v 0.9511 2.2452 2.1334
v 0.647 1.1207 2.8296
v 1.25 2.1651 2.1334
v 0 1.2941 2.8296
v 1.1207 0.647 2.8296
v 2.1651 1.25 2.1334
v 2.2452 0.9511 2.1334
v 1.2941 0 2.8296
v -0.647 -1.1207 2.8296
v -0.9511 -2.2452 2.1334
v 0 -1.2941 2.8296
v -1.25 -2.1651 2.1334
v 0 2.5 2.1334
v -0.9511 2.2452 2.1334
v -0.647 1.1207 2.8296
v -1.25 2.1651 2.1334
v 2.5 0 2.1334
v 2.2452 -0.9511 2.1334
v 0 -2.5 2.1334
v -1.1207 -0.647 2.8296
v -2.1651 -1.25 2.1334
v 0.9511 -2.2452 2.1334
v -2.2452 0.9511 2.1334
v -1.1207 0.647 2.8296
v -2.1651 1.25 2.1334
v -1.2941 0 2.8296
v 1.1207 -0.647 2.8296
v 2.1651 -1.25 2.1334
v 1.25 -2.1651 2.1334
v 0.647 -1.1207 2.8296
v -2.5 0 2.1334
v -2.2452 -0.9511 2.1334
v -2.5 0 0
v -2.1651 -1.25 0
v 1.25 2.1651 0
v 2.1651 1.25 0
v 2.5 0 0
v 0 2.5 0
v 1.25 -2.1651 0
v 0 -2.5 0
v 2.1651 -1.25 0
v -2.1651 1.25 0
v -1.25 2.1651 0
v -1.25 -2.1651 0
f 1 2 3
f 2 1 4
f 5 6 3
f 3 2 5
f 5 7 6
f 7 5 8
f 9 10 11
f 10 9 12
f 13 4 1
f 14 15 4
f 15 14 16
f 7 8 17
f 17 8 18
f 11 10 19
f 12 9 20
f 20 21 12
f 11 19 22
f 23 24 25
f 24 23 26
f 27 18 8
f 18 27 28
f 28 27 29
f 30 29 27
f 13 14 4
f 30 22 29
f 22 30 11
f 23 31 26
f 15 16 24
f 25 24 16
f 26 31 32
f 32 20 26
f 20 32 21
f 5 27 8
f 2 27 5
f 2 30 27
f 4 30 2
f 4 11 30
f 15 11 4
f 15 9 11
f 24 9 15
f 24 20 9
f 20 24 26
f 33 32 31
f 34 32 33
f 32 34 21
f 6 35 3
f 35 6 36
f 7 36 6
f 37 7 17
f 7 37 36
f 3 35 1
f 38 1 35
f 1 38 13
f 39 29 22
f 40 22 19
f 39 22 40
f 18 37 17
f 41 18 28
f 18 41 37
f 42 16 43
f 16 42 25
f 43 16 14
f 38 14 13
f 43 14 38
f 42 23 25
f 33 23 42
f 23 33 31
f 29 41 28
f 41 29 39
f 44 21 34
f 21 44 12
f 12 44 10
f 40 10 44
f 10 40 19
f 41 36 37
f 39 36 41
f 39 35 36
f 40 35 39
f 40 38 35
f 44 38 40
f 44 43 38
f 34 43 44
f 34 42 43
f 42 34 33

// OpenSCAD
// file: lib.scad
function x(v) = v[0];
function y(v) = v[1];
function z(v) = v[2];
function add(v1,v2) = [ for (i = [ 0 : len(v1)-1 ]) v1[i] + v2[i] ];
function xv(d) = [d,0,0];
function yv(d) = [0,d,0];
function zv(d) = [0,0,d];

module box(v) { cube(size=v, center=true); }
module cyl(r1,r2,h) { cylinder(r1=r1, r2=r2, h=h, center=true); }

function grow(n,v) = [x(v)+n*2, y(v)+n*2, z(v)+n*2];

module rbox(v, radius=1) {
	cx = x(v)/2-radius;
	cy = y(v)/2-radius;
	cz = z(v)/2-radius;

	hull() {
		translate([cx,cy,cz]) sphere(r=radius);
		translate([cx,cy,-cz]) sphere(r=radius);
		translate([cx,-cy,cz]) sphere(r=radius);
		translate([cx,-cy,-cz]) sphere(r=radius);
		translate([-cx,cy,cz]) sphere(r=radius);
		translate([-cx,cy,-cz]) sphere(r=radius);
		translate([-cx,-cy,cz]) sphere(r=radius);
		translate([-cx,-cy,-cz]) sphere(r=radius);
	}
}

module fillet(r=1) {
  minkowski() {
    difference() {
      children();
      minkowski() {
        difference() {
          minkowski() {
            children();
            sphere(r=r);
          }
          children();
        }
        sphere(r=r);
      }
    }
    sphere(r=r);
  }
}
// main file
use <lib.scad>

module tank() {
	translate([0,0,-2]) intersection() {
		sphere(r=5);
		cyl(2.5,2.5,10);
		translate([0,0,3.5]) box([5,5,3]);
	}
}

hd=72;
ld=12;

//tank($fn=hd);
tank($fn=ld);
